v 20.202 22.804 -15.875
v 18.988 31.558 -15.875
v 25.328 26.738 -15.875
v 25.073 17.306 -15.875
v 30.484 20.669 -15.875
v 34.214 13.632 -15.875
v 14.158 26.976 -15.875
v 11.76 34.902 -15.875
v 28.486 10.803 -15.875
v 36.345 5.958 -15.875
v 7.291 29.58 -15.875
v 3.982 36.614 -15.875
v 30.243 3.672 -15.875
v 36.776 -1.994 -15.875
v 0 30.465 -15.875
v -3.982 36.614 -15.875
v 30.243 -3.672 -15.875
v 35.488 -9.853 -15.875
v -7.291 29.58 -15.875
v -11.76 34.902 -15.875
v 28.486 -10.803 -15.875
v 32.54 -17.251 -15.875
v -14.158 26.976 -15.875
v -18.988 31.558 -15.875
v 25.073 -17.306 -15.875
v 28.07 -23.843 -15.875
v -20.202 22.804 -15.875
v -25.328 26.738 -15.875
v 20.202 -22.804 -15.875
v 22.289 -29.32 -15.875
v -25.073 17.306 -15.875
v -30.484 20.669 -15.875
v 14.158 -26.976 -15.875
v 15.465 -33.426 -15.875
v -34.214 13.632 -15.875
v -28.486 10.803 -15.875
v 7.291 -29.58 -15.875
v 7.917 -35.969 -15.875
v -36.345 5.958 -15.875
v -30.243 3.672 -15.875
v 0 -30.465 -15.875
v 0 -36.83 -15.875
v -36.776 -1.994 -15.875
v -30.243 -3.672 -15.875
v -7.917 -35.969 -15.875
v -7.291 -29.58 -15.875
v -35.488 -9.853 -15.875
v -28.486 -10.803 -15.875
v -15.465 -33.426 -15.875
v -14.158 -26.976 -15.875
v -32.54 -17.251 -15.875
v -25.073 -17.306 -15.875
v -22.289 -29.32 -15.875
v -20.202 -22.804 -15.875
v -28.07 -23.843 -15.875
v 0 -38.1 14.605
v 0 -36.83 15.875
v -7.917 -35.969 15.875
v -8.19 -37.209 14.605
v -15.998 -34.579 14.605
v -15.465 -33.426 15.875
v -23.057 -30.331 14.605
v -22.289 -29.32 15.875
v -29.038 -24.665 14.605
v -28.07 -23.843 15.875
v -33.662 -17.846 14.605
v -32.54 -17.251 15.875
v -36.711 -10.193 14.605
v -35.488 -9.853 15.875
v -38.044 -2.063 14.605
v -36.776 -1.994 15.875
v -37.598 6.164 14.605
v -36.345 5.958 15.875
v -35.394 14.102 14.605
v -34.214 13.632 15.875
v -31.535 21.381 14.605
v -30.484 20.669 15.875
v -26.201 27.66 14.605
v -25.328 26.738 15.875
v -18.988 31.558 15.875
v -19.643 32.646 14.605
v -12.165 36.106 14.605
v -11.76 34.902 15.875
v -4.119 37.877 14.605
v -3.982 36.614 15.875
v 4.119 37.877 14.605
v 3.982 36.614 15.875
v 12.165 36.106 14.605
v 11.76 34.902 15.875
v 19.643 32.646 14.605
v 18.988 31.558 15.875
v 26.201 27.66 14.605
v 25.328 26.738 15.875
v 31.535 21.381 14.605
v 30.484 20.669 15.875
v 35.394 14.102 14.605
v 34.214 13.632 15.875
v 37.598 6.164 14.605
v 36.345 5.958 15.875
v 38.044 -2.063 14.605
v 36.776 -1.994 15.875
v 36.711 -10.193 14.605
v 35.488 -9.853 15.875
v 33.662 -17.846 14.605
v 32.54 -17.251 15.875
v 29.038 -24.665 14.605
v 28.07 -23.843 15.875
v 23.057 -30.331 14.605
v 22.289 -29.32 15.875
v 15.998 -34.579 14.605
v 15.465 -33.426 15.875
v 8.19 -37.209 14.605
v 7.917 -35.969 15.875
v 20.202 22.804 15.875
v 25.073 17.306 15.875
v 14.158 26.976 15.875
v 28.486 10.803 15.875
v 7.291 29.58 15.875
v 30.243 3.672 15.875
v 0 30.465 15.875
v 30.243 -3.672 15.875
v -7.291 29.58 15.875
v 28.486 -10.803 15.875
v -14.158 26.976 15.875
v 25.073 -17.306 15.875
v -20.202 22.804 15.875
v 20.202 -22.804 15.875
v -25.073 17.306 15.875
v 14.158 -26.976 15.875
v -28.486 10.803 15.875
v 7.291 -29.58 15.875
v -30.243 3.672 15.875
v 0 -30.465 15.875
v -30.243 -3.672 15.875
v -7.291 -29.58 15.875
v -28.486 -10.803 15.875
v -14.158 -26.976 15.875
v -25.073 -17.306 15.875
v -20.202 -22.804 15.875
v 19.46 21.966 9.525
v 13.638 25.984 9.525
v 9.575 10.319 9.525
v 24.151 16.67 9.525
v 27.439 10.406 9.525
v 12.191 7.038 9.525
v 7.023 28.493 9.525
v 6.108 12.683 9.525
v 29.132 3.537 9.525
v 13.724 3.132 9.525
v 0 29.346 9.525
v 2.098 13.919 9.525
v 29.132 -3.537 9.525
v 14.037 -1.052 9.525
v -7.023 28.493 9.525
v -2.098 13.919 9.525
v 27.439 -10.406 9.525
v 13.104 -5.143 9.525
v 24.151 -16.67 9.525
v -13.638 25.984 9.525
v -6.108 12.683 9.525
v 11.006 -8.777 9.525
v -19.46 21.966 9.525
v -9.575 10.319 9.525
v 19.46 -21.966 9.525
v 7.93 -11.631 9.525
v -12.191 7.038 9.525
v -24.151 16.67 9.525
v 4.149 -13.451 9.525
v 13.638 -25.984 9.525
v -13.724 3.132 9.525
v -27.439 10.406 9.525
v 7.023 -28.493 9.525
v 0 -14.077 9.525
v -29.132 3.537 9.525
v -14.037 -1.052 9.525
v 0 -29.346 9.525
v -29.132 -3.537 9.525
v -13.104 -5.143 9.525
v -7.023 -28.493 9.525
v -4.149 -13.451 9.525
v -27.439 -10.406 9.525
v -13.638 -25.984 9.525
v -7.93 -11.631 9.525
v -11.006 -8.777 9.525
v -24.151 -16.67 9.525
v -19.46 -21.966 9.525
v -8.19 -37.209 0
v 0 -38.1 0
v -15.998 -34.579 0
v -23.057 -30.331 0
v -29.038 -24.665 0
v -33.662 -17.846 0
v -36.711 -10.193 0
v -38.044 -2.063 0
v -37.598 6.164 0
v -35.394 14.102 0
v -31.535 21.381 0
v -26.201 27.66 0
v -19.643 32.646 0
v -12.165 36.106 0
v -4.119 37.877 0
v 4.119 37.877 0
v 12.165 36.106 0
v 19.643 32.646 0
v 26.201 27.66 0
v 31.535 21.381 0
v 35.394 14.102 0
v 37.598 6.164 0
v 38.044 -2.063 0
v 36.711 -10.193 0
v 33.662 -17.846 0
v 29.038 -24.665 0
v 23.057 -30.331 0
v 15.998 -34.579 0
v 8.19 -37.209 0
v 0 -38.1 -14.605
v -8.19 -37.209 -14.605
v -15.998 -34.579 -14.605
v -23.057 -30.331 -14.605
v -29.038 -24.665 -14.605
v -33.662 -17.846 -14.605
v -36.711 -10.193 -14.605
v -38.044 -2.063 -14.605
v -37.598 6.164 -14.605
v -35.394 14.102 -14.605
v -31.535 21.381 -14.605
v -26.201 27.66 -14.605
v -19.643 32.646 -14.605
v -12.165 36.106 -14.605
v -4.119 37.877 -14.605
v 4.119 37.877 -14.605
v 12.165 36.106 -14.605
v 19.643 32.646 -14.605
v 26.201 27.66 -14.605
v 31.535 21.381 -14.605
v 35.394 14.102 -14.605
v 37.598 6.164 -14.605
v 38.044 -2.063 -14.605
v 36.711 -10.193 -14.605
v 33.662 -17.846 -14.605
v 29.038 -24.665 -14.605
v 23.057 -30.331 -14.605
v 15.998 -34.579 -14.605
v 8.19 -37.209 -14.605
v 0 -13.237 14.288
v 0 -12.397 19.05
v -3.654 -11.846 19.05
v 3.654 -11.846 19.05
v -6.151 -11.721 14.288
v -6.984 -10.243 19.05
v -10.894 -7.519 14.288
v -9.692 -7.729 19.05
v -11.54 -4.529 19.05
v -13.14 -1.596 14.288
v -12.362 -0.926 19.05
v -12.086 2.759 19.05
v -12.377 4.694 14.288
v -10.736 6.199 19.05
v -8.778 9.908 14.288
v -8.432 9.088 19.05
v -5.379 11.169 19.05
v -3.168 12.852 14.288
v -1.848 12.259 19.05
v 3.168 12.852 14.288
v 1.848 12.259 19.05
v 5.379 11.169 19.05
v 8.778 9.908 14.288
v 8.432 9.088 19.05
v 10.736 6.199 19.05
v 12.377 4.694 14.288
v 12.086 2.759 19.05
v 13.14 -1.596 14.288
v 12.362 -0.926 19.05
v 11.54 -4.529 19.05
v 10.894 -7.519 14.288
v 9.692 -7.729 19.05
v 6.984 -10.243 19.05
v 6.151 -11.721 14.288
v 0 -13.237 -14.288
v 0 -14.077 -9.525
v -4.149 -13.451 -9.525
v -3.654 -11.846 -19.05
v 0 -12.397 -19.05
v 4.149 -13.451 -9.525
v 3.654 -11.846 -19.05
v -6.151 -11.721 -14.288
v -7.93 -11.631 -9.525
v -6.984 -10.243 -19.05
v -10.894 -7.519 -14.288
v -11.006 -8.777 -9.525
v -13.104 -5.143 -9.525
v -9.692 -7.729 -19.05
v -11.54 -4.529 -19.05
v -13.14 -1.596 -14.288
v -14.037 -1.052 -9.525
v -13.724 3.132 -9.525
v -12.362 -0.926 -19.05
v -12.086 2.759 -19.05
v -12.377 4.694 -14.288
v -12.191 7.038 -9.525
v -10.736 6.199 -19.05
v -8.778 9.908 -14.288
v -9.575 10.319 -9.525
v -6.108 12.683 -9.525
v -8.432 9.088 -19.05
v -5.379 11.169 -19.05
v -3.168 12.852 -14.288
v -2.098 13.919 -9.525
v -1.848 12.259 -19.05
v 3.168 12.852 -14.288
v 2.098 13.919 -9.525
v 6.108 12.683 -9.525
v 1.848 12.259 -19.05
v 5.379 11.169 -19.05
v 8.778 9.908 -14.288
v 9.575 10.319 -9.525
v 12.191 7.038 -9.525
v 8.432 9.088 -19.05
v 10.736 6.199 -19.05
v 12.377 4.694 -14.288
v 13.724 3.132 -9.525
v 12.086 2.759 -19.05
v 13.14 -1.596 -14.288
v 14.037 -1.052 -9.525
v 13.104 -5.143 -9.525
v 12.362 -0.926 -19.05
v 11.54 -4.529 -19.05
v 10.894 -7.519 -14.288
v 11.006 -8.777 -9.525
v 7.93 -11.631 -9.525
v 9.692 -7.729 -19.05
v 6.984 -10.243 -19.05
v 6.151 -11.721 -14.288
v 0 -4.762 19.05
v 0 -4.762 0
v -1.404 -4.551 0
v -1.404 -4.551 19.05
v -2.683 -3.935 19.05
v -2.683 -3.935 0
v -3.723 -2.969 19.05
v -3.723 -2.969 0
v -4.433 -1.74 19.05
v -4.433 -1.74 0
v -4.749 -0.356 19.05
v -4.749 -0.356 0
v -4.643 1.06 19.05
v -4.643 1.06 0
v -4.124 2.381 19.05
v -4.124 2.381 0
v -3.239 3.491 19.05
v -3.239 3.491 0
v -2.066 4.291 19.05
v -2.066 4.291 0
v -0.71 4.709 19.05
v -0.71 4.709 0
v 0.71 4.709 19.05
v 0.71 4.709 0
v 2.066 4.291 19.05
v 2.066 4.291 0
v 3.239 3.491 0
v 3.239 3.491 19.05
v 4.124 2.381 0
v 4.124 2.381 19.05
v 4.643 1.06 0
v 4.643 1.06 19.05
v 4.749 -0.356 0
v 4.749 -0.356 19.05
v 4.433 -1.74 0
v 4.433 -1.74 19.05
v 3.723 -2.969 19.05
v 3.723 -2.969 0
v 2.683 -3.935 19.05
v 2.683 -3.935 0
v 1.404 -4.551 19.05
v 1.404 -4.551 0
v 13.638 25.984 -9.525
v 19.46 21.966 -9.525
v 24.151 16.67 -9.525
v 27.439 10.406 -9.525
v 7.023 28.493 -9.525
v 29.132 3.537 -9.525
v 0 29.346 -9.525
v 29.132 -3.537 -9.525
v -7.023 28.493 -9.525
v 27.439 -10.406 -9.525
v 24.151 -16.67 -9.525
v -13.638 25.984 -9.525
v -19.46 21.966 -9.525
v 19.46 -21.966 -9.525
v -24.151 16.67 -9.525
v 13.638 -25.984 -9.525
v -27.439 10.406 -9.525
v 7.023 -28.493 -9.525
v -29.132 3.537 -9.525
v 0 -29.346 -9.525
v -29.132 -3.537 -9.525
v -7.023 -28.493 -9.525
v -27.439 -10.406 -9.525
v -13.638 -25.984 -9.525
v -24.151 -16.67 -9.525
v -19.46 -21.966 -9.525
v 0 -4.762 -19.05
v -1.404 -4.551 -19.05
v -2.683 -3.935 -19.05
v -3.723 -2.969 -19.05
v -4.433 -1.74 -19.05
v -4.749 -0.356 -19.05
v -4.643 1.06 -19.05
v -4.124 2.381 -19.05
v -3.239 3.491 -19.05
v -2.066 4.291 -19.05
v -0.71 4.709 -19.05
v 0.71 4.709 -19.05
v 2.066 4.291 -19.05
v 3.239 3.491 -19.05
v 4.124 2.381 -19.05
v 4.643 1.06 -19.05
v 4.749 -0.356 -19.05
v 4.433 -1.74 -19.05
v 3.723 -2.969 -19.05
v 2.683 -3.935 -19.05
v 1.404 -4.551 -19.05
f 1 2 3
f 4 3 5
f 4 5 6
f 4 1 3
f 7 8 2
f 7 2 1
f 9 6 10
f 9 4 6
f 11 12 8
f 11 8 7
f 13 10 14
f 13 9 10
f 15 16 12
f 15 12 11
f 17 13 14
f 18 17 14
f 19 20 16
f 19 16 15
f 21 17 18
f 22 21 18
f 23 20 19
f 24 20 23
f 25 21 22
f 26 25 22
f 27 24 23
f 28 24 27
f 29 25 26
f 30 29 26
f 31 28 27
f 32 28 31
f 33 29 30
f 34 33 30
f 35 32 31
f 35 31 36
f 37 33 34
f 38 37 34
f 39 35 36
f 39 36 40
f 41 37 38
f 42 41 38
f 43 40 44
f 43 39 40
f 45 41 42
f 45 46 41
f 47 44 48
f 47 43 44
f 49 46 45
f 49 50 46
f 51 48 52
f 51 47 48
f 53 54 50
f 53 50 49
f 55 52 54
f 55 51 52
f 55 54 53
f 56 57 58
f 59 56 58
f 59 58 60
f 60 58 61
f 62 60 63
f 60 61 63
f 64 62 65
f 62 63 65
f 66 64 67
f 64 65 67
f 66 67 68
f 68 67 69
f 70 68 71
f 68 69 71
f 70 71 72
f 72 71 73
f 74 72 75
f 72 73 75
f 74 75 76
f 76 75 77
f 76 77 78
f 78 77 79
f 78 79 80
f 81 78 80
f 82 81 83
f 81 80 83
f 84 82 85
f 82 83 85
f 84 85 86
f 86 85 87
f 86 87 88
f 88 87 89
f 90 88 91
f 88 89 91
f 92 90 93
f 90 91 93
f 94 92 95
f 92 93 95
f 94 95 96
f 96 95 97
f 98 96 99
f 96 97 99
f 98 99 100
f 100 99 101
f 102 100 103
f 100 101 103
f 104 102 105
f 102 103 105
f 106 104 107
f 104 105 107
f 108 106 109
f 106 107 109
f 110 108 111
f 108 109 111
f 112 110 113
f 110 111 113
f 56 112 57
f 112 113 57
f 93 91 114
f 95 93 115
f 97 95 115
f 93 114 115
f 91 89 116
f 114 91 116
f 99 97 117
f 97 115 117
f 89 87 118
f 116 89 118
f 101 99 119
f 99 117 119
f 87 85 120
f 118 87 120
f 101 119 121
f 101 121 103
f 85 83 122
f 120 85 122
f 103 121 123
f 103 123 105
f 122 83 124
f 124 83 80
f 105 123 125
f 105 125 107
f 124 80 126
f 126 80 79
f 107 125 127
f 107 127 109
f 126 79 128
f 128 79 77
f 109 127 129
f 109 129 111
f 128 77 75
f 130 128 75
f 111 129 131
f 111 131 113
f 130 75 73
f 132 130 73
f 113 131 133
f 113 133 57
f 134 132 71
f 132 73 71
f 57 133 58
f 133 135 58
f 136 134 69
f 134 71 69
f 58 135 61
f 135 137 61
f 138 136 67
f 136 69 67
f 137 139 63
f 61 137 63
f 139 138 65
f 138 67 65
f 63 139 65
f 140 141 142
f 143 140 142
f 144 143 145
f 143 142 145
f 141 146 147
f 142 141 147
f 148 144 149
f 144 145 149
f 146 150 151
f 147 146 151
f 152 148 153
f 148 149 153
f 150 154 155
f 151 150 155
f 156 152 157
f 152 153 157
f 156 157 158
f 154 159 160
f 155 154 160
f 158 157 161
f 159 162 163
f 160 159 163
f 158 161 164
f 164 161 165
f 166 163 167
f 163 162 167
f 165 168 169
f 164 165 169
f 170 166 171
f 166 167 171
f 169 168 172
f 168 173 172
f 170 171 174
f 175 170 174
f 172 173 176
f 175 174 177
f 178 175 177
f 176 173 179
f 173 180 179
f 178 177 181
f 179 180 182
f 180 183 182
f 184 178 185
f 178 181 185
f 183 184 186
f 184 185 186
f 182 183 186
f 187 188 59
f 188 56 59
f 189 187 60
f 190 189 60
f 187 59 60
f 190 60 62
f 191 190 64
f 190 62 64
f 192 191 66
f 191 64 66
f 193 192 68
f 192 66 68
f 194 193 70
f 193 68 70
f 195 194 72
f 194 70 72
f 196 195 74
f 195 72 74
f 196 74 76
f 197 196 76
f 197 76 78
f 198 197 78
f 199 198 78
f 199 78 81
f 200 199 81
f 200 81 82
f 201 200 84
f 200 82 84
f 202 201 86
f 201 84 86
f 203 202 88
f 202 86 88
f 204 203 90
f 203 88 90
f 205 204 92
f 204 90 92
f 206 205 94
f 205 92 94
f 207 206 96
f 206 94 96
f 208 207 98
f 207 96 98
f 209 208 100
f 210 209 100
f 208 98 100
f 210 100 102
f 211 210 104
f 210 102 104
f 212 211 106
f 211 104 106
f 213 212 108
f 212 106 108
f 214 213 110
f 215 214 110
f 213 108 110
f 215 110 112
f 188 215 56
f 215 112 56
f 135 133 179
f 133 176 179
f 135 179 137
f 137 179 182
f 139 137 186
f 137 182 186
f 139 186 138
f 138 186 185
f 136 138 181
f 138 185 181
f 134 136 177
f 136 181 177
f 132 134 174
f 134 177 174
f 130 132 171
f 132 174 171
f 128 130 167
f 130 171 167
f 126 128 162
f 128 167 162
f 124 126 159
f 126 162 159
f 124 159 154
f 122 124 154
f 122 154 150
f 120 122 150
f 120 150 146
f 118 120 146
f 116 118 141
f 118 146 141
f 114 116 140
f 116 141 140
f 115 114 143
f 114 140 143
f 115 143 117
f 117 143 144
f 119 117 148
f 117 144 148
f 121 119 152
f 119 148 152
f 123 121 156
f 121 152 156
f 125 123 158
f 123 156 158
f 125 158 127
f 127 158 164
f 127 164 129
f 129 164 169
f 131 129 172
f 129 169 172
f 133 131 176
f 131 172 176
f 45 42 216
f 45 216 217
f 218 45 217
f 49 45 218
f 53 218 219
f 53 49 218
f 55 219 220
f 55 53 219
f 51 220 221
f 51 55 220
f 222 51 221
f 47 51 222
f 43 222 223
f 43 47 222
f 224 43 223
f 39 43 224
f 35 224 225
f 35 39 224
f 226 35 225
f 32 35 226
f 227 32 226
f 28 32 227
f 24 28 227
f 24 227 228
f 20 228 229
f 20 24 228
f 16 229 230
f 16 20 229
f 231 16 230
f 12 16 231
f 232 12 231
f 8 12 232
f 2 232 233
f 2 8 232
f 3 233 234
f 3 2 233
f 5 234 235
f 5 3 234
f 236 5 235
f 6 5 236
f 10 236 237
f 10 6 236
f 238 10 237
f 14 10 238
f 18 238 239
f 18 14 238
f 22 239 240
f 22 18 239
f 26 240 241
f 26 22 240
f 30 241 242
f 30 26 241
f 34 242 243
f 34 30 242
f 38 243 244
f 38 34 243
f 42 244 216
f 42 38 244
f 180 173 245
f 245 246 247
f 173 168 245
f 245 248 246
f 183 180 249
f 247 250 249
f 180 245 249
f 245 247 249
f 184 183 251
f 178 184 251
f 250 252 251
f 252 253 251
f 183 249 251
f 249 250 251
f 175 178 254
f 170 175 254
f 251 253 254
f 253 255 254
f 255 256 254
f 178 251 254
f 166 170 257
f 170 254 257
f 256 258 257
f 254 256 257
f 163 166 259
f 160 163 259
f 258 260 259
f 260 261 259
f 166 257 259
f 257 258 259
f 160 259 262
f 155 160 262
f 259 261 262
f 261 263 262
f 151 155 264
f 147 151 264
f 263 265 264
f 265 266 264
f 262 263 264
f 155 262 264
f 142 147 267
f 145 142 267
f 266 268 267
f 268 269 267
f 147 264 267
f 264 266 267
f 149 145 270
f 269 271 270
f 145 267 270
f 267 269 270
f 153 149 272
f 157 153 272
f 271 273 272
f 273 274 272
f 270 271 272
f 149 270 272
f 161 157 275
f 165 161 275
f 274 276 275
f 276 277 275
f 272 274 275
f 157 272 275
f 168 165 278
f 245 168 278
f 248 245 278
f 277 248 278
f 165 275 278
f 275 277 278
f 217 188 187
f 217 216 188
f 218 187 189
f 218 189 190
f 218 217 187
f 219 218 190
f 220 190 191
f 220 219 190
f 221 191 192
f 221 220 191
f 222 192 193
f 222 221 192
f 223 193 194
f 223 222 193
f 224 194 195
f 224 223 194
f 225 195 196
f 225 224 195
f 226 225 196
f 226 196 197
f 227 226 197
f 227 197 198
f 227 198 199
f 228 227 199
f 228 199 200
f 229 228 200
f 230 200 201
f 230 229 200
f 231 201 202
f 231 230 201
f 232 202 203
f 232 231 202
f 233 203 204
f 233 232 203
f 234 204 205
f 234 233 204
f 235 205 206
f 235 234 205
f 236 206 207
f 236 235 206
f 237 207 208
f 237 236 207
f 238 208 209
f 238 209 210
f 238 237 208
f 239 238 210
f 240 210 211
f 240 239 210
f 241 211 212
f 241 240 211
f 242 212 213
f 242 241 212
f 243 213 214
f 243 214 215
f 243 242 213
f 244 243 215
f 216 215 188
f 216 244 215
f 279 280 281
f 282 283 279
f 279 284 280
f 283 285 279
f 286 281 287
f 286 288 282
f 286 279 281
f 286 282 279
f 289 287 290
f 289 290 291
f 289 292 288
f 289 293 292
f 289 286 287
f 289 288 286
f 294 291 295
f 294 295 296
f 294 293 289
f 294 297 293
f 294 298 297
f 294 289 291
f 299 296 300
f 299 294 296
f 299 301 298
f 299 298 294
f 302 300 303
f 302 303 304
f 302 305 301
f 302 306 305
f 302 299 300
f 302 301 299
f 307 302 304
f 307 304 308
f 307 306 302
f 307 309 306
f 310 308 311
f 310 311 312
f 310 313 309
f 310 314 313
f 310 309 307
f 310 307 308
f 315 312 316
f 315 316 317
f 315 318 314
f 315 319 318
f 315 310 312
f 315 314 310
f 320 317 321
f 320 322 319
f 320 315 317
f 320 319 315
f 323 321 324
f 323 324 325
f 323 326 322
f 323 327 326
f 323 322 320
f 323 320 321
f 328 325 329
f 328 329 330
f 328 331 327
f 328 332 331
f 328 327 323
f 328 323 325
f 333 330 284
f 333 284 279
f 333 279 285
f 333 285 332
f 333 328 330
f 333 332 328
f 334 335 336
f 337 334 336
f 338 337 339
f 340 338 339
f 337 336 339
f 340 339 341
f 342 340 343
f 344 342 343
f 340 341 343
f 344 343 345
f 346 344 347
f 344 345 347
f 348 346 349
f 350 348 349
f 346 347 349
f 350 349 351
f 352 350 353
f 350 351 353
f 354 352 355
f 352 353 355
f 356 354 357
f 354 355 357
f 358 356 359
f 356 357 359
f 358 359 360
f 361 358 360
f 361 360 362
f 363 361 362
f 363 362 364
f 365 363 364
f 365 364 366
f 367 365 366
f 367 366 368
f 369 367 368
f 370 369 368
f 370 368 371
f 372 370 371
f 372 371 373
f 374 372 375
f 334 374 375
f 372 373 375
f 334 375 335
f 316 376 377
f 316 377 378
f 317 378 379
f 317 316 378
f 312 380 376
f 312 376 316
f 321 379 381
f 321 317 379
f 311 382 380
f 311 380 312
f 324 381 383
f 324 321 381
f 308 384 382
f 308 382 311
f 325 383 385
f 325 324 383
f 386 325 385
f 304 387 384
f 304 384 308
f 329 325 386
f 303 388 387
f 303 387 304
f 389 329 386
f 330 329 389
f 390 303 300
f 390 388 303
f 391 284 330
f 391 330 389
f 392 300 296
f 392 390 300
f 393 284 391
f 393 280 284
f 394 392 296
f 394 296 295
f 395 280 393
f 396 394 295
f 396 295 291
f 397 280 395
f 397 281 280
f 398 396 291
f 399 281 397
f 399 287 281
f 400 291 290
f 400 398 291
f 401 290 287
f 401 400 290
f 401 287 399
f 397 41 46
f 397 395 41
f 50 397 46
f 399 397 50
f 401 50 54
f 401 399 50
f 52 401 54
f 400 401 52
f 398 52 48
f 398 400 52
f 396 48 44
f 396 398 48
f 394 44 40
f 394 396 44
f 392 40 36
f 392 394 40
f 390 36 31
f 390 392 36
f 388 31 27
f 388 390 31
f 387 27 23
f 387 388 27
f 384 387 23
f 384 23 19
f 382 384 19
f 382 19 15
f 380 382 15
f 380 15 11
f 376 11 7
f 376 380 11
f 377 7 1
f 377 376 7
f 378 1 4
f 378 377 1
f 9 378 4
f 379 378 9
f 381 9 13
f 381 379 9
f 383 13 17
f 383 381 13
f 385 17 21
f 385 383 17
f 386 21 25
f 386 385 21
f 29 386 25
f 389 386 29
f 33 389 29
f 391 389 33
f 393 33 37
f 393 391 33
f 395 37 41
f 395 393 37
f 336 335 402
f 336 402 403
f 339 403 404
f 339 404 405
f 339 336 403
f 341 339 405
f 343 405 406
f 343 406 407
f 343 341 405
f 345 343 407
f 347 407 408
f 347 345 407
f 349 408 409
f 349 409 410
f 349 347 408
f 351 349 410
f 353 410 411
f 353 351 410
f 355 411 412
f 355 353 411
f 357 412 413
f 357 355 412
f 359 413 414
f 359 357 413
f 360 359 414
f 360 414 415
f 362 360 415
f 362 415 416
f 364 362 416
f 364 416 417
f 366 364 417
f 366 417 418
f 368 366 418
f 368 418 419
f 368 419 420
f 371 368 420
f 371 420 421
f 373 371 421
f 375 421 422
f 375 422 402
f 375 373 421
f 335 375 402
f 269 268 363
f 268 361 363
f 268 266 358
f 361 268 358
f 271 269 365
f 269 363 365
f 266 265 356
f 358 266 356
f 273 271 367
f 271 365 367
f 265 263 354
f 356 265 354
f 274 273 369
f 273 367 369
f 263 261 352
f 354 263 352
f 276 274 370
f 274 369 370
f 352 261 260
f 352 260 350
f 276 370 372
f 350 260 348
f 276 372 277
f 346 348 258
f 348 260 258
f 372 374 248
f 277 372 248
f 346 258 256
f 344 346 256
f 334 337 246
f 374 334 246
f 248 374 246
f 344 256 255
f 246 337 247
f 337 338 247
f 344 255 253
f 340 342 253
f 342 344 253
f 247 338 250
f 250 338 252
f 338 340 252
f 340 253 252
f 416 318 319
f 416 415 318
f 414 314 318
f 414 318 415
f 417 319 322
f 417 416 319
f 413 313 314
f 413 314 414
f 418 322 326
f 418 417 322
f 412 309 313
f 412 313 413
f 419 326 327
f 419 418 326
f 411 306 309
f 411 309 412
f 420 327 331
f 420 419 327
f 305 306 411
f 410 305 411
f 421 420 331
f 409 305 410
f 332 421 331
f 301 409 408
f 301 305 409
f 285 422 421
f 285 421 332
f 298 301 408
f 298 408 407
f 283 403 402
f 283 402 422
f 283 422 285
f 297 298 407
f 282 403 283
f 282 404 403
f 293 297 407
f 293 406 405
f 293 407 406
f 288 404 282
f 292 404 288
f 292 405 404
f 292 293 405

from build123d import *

# Parameters (mm, degrees)
CHAMFER1_SIZE = 1.27


with BuildPart() as part:
    # Sketch2 → Revolve1 (revolve)
    with BuildSketch(Plane(origin=(0, 0, 0), x_dir=(0, 0, -1), z_dir=(1, 0, 0)), mode=Mode.PRIVATE) as revolve1_sk:
        Polygon((0, 38.1), (-15.875, 38.1), (-15.875, 30.465422705), (-9.525, 29.345746377), (-9.525, 21.711169082), (-9.525, 14.076591787), (-19.05, 12.397077295), (-19.05, 4.7625), (0, 4.7625), align=None)
    revolve(revolve1_sk.sketch.rotate(Axis((0, 0, 19.05), (0, 0, -1)), 180), axis=Axis((0, 0, 19.05), (0, 0, -1)))

    # Chamfer1
    chamfer1_edges = [part.edges().sort_by_distance(p)[0] for p in [
        (0, 38.1, 15.875),
    ]]
    chamfer(chamfer1_edges, length=CHAMFER1_SIZE)

    # Mirror2: part across plane


with BuildPart() as part_1:
    add(part.part)
    add(part.part.mirror(Plane.XY))


solid = part_1.part
